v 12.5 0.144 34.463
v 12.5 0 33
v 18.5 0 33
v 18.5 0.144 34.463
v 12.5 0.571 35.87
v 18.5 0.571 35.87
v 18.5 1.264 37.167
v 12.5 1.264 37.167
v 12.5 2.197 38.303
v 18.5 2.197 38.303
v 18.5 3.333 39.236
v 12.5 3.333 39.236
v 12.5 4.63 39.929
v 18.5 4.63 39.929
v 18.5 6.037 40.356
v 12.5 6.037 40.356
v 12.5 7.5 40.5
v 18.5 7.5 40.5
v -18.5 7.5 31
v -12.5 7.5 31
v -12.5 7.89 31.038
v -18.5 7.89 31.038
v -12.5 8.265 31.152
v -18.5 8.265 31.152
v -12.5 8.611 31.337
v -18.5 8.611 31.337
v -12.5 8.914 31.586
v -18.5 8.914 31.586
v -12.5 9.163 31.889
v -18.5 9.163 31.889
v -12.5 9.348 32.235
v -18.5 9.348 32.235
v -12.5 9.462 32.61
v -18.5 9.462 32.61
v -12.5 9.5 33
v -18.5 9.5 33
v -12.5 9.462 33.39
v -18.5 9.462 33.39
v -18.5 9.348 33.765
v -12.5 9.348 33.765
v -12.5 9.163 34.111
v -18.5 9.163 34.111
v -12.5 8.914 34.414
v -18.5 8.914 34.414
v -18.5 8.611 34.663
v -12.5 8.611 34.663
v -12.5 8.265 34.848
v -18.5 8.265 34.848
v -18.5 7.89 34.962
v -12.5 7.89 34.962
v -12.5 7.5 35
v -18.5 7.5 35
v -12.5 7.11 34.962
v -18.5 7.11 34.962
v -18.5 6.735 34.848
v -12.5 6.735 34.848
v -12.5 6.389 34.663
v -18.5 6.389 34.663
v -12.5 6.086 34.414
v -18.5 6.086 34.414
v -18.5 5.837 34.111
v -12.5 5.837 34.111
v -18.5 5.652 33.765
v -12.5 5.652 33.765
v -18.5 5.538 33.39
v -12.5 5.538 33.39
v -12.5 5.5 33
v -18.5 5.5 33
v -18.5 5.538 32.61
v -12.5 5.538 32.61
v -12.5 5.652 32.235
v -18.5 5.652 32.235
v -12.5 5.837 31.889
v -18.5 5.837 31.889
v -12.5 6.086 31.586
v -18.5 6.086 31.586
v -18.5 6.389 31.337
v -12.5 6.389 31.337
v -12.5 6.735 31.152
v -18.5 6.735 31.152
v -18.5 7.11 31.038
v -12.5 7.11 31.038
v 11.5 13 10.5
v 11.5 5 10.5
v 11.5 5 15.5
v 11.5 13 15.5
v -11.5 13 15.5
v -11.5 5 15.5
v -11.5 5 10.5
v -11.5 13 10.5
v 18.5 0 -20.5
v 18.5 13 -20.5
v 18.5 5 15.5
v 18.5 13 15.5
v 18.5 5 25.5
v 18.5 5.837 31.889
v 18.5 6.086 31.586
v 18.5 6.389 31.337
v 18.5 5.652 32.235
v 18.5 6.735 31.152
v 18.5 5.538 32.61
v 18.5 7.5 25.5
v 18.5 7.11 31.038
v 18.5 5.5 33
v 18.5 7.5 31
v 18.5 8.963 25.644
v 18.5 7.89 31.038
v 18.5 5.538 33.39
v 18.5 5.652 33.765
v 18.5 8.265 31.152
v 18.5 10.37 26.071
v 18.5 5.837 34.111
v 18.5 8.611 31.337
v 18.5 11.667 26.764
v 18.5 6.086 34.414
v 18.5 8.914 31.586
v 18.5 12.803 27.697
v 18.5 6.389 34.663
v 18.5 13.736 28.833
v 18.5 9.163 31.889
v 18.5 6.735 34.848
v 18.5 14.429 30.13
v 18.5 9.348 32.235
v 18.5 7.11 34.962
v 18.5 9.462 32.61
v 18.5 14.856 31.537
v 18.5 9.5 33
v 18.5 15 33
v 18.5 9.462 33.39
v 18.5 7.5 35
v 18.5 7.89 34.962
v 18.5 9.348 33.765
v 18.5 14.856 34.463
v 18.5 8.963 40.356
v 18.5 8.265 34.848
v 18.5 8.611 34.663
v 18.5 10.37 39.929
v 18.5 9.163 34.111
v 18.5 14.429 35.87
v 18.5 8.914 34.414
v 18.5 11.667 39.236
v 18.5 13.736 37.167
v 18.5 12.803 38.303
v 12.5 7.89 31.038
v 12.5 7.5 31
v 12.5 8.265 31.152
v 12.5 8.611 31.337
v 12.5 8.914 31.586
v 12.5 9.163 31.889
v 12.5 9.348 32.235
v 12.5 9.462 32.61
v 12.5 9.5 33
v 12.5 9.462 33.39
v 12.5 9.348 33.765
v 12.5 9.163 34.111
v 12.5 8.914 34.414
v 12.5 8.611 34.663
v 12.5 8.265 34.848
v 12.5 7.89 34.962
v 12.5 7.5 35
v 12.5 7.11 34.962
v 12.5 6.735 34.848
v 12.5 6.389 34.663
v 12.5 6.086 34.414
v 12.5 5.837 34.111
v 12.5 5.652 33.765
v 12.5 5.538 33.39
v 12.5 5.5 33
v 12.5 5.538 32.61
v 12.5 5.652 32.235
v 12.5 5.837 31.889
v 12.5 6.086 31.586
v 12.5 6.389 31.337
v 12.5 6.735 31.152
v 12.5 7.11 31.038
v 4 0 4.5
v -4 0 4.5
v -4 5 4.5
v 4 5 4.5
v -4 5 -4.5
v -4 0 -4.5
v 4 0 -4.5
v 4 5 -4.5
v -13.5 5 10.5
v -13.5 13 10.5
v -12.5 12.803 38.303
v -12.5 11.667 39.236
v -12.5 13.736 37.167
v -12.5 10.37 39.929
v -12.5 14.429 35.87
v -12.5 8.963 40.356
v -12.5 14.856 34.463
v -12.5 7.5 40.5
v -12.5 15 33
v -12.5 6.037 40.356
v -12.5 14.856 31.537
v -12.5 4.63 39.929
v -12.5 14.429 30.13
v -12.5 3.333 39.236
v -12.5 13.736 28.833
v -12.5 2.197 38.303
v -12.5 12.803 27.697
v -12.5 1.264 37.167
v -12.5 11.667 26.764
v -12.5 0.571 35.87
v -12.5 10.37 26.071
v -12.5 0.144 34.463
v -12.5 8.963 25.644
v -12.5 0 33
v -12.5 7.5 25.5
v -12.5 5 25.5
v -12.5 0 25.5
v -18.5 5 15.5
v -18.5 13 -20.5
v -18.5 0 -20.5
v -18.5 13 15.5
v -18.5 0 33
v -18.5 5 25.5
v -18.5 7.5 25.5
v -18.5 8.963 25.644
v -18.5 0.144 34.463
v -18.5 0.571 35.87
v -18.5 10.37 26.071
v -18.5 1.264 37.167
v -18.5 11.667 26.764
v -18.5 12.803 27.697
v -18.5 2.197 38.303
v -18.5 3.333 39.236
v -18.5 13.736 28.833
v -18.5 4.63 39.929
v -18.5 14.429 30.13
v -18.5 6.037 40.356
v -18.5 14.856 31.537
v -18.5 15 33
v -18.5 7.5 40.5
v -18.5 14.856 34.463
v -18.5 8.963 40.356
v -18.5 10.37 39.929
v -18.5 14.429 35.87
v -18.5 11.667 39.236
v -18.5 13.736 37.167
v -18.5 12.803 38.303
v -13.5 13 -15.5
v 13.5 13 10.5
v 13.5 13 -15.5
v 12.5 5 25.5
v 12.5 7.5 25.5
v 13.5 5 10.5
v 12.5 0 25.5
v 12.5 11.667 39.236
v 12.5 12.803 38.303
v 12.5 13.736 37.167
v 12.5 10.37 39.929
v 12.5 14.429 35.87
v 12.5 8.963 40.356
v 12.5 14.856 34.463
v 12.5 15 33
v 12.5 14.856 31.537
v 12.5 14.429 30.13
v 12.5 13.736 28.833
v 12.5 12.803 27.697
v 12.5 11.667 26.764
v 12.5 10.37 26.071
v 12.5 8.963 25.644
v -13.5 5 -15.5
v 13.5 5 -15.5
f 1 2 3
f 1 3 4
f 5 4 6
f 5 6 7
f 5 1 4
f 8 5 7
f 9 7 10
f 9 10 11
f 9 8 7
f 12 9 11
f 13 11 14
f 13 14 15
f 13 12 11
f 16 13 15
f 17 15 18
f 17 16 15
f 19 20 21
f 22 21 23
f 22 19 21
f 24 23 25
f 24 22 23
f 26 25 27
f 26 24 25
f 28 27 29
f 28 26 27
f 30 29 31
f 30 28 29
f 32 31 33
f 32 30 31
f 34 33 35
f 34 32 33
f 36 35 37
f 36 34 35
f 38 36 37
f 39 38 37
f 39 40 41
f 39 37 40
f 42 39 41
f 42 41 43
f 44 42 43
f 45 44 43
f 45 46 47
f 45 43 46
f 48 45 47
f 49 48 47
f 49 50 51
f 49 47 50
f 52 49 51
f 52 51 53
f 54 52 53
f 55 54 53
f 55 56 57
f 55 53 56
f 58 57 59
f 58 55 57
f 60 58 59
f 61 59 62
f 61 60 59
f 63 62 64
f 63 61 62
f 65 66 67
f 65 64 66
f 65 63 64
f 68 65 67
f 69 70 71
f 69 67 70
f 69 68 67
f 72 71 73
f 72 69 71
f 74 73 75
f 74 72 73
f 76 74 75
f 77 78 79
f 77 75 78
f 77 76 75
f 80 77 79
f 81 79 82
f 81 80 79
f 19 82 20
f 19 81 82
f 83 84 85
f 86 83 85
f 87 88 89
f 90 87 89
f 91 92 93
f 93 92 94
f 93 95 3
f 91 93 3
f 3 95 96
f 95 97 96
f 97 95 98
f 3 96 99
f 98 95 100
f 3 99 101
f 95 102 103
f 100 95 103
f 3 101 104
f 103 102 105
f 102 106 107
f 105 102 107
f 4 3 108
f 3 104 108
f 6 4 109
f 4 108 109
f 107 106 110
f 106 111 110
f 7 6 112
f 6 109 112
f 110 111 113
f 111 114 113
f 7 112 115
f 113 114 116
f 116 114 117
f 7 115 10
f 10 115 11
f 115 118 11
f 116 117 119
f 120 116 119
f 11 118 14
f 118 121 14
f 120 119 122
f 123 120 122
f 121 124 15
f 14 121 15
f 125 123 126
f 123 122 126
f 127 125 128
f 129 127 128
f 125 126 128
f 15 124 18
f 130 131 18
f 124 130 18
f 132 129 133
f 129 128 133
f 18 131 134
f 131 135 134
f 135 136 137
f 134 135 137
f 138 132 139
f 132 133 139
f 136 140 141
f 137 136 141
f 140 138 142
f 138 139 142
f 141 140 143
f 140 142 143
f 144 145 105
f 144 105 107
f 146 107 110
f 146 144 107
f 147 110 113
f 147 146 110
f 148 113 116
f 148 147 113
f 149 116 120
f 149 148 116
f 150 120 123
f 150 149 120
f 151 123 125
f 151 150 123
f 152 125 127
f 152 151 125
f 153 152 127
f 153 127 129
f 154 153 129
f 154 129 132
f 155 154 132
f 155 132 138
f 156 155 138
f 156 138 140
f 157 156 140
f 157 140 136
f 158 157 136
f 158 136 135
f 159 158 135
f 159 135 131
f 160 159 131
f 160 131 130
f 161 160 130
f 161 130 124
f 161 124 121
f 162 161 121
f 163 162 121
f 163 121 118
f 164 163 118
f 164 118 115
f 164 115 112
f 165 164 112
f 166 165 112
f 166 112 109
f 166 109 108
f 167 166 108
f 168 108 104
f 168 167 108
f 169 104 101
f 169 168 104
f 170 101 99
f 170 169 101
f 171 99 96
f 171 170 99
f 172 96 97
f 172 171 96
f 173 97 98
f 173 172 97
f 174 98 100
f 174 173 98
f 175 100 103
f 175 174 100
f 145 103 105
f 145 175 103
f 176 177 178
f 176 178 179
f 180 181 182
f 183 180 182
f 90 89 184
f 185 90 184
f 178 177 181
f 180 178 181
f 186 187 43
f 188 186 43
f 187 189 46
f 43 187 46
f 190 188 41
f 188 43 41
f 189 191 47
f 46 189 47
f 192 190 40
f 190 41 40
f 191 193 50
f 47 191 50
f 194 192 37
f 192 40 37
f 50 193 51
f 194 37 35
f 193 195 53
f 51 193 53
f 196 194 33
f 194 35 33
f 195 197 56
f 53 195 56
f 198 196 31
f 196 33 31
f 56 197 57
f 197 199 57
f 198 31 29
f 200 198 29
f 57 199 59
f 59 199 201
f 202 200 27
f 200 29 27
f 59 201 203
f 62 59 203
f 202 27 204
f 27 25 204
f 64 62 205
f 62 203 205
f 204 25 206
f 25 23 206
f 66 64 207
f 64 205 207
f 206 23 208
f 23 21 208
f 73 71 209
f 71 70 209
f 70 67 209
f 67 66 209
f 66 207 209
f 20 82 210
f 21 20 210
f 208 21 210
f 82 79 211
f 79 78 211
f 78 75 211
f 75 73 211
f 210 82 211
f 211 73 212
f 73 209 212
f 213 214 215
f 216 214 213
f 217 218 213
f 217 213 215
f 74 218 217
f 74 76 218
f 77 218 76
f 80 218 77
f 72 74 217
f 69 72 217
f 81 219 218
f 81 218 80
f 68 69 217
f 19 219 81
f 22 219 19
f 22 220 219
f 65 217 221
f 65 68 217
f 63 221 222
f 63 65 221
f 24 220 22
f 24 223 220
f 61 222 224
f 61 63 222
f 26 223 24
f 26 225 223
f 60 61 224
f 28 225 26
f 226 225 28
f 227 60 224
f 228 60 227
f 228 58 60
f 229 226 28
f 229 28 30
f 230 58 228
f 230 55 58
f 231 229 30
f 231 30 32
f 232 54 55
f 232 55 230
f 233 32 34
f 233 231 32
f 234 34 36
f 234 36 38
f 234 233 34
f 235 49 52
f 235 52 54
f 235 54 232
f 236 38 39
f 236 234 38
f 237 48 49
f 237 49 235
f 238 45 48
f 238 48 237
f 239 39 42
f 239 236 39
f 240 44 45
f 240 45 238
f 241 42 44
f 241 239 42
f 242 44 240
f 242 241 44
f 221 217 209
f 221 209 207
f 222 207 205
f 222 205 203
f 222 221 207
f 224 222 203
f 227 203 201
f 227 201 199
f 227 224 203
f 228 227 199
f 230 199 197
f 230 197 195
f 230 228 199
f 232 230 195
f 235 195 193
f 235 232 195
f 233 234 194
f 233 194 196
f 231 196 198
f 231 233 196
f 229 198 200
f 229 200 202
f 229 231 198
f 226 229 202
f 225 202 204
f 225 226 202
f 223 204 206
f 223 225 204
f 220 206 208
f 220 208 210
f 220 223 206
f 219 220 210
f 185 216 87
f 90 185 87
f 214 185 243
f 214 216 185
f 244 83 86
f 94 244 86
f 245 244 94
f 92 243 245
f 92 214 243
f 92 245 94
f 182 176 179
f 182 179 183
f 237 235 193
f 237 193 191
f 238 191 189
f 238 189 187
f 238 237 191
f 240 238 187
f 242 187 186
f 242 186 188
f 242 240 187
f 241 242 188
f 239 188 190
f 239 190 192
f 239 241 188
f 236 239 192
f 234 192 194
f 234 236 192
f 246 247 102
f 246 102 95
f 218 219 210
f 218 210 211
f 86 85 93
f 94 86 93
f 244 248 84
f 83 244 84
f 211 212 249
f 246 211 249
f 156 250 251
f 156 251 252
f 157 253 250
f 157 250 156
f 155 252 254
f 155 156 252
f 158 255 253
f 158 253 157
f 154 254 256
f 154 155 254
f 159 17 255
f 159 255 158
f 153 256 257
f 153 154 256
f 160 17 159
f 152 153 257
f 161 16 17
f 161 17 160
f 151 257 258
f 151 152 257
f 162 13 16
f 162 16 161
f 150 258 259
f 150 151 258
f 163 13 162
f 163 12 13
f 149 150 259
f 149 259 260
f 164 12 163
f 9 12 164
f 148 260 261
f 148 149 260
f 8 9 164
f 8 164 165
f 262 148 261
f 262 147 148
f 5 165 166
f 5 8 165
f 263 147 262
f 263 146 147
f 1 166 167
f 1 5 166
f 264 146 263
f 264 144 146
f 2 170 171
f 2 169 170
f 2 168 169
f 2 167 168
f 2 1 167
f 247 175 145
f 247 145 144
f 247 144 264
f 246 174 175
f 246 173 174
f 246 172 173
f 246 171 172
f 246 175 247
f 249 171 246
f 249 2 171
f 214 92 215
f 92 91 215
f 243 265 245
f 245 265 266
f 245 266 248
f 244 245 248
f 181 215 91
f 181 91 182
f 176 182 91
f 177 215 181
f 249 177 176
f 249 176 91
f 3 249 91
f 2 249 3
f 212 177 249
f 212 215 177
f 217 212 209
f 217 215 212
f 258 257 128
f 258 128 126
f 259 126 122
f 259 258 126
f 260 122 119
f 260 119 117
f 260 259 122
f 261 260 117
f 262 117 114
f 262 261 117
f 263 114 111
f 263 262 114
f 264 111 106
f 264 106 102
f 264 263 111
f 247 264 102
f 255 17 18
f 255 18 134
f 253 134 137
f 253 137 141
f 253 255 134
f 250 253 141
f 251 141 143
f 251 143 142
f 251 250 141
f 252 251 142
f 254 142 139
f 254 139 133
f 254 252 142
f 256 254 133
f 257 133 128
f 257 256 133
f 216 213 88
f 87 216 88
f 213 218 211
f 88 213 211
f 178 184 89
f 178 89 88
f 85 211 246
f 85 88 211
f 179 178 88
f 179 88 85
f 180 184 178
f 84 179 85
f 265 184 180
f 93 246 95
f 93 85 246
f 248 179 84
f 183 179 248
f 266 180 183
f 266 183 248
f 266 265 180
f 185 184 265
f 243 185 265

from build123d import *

# Parameters (mm, degrees)
SKIZZE1_W                            = 37
SKIZZE1_H                            = 46
SKIZZE1_W_2                          = 25
SKIZZE1_H_2                          = 24
SKIZZE1_W_3                          = 8
SKIZZE1_H_3                          = 9
AUFSATZ_LINEAR_AUSTRAGEN2_DEPTH      = 5
AUFSATZ_LINEAR_AUSTRAGEN3_DEPTH      = 8
AUFSATZ_LINEAR_AUSTRAGEN4_DEPTH      = 37
SCHNITT_LINEAR_AUSTRAGEN1_DEPTH      = 22
SCHNITT_LINEAR_AUSTRAGEN1_DEPTH_BACK = 11
SKIZZE4_W                            = 25
SKIZZE4_H                            = 15


with BuildPart() as part:
    # Skizze1 → Aufsatz-Linear austragen2 (new body)
    # profile 1 of 2: a face of its own
    with BuildSketch(Plane(origin=(0, 0, 0), x_dir=(1, 0, 0), z_dir=(0, 1, 0))):
        with Locations((0, -2.5)):
            Rectangle(SKIZZE1_W, SKIZZE1_H)
        with Locations((0, 2.5)):
            Rectangle(SKIZZE1_W_2, SKIZZE1_H_2, mode=Mode.SUBTRACT)
    # profile 2 of 2: a face of its own
    with BuildSketch(Plane(origin=(0, 0, 0), x_dir=(1, 0, 0), z_dir=(0, 1, 0))):
        with Locations((0, 2.5)):
            Rectangle(SKIZZE1_W_2, SKIZZE1_H_2)
        Rectangle(SKIZZE1_W_3, SKIZZE1_H_3, mode=Mode.SUBTRACT)
    extrude(amount=AUFSATZ_LINEAR_AUSTRAGEN2_DEPTH)

    # Skizze2 → Aufsatz-Linear austragen3 (add)
    with BuildSketch(Plane(origin=(0, 5, 0), x_dir=(1, 0, 0), z_dir=(0, 1, 0))):
        Polygon((-13.5, -10.5), (-13.5, 15.5), (13.5, 15.5), (13.5, -10.5), (18.5, -10.5), (18.5, 20.5), (-18.5, 20.5), (-18.5, -10.5), align=None)
        Polygon((-11.5, -10.5), (-13.5, -10.5), (-18.5, -10.5), (-18.5, -15.5), (-11.5, -15.5), align=None)
        Polygon((18.5, -10.5), (13.5, -10.5), (11.5, -10.5), (11.5, -15.5), (18.5, -15.5), align=None)
    extrude(amount=AUFSATZ_LINEAR_AUSTRAGEN3_DEPTH)

    # Skizze3 → Aufsatz-Linear austragen4 (add)
    with BuildSketch(Plane.ZY.offset(18.5)):
        with BuildLine():
            Line((25.5, 0), (33, 0))
            ThreePointArc((33, 0), (27.696699141, 2.196699141), (25.5, 7.5))
            Line((25.5, 7.5), (25.5, 5))
            Line((25.5, 5), (25.5, 0))
        make_face()
        with BuildLine():
            ThreePointArc((31, 7.5), (33, 9.5), (35, 7.5))
            Line((35, 7.5), (40.5, 7.5))
            ThreePointArc((40.5, 7.5), (38.303300859, 12.803300859), (33, 15))
            ThreePointArc((33, 15), (27.696699141, 12.803300859), (25.5, 7.5))
            Line((25.5, 7.5), (31, 7.5))
        make_face()
        with BuildLine():
            Line((40.5, 7.5), (35, 7.5))
            ThreePointArc((35, 7.5), (33, 5.5), (31, 7.5))
            Line((31, 7.5), (25.5, 7.5))
            ThreePointArc((25.5, 7.5), (27.696699141, 2.196699141), (33, 0))
            ThreePointArc((33, 0), (38.303300859, 2.196699141), (40.5, 7.5))
        make_face()
    extrude(amount=-AUFSATZ_LINEAR_AUSTRAGEN4_DEPTH)

    # Skizze4 → Schnitt-Linear austragen1 (cut, two sides: drawn at the far end of the back side and taken through both)
    with BuildSketch(Plane(origin=(0, 5, 0), x_dir=(1, 0, 0), z_dir=(0, 1, 0)).offset(-SCHNITT_LINEAR_AUSTRAGEN1_DEPTH_BACK)):
        with Locations((0, -33)):
            Rectangle(SKIZZE4_W, SKIZZE4_H)
    extrude(amount=SCHNITT_LINEAR_AUSTRAGEN1_DEPTH + SCHNITT_LINEAR_AUSTRAGEN1_DEPTH_BACK, mode=Mode.SUBTRACT)


solid = part.part
